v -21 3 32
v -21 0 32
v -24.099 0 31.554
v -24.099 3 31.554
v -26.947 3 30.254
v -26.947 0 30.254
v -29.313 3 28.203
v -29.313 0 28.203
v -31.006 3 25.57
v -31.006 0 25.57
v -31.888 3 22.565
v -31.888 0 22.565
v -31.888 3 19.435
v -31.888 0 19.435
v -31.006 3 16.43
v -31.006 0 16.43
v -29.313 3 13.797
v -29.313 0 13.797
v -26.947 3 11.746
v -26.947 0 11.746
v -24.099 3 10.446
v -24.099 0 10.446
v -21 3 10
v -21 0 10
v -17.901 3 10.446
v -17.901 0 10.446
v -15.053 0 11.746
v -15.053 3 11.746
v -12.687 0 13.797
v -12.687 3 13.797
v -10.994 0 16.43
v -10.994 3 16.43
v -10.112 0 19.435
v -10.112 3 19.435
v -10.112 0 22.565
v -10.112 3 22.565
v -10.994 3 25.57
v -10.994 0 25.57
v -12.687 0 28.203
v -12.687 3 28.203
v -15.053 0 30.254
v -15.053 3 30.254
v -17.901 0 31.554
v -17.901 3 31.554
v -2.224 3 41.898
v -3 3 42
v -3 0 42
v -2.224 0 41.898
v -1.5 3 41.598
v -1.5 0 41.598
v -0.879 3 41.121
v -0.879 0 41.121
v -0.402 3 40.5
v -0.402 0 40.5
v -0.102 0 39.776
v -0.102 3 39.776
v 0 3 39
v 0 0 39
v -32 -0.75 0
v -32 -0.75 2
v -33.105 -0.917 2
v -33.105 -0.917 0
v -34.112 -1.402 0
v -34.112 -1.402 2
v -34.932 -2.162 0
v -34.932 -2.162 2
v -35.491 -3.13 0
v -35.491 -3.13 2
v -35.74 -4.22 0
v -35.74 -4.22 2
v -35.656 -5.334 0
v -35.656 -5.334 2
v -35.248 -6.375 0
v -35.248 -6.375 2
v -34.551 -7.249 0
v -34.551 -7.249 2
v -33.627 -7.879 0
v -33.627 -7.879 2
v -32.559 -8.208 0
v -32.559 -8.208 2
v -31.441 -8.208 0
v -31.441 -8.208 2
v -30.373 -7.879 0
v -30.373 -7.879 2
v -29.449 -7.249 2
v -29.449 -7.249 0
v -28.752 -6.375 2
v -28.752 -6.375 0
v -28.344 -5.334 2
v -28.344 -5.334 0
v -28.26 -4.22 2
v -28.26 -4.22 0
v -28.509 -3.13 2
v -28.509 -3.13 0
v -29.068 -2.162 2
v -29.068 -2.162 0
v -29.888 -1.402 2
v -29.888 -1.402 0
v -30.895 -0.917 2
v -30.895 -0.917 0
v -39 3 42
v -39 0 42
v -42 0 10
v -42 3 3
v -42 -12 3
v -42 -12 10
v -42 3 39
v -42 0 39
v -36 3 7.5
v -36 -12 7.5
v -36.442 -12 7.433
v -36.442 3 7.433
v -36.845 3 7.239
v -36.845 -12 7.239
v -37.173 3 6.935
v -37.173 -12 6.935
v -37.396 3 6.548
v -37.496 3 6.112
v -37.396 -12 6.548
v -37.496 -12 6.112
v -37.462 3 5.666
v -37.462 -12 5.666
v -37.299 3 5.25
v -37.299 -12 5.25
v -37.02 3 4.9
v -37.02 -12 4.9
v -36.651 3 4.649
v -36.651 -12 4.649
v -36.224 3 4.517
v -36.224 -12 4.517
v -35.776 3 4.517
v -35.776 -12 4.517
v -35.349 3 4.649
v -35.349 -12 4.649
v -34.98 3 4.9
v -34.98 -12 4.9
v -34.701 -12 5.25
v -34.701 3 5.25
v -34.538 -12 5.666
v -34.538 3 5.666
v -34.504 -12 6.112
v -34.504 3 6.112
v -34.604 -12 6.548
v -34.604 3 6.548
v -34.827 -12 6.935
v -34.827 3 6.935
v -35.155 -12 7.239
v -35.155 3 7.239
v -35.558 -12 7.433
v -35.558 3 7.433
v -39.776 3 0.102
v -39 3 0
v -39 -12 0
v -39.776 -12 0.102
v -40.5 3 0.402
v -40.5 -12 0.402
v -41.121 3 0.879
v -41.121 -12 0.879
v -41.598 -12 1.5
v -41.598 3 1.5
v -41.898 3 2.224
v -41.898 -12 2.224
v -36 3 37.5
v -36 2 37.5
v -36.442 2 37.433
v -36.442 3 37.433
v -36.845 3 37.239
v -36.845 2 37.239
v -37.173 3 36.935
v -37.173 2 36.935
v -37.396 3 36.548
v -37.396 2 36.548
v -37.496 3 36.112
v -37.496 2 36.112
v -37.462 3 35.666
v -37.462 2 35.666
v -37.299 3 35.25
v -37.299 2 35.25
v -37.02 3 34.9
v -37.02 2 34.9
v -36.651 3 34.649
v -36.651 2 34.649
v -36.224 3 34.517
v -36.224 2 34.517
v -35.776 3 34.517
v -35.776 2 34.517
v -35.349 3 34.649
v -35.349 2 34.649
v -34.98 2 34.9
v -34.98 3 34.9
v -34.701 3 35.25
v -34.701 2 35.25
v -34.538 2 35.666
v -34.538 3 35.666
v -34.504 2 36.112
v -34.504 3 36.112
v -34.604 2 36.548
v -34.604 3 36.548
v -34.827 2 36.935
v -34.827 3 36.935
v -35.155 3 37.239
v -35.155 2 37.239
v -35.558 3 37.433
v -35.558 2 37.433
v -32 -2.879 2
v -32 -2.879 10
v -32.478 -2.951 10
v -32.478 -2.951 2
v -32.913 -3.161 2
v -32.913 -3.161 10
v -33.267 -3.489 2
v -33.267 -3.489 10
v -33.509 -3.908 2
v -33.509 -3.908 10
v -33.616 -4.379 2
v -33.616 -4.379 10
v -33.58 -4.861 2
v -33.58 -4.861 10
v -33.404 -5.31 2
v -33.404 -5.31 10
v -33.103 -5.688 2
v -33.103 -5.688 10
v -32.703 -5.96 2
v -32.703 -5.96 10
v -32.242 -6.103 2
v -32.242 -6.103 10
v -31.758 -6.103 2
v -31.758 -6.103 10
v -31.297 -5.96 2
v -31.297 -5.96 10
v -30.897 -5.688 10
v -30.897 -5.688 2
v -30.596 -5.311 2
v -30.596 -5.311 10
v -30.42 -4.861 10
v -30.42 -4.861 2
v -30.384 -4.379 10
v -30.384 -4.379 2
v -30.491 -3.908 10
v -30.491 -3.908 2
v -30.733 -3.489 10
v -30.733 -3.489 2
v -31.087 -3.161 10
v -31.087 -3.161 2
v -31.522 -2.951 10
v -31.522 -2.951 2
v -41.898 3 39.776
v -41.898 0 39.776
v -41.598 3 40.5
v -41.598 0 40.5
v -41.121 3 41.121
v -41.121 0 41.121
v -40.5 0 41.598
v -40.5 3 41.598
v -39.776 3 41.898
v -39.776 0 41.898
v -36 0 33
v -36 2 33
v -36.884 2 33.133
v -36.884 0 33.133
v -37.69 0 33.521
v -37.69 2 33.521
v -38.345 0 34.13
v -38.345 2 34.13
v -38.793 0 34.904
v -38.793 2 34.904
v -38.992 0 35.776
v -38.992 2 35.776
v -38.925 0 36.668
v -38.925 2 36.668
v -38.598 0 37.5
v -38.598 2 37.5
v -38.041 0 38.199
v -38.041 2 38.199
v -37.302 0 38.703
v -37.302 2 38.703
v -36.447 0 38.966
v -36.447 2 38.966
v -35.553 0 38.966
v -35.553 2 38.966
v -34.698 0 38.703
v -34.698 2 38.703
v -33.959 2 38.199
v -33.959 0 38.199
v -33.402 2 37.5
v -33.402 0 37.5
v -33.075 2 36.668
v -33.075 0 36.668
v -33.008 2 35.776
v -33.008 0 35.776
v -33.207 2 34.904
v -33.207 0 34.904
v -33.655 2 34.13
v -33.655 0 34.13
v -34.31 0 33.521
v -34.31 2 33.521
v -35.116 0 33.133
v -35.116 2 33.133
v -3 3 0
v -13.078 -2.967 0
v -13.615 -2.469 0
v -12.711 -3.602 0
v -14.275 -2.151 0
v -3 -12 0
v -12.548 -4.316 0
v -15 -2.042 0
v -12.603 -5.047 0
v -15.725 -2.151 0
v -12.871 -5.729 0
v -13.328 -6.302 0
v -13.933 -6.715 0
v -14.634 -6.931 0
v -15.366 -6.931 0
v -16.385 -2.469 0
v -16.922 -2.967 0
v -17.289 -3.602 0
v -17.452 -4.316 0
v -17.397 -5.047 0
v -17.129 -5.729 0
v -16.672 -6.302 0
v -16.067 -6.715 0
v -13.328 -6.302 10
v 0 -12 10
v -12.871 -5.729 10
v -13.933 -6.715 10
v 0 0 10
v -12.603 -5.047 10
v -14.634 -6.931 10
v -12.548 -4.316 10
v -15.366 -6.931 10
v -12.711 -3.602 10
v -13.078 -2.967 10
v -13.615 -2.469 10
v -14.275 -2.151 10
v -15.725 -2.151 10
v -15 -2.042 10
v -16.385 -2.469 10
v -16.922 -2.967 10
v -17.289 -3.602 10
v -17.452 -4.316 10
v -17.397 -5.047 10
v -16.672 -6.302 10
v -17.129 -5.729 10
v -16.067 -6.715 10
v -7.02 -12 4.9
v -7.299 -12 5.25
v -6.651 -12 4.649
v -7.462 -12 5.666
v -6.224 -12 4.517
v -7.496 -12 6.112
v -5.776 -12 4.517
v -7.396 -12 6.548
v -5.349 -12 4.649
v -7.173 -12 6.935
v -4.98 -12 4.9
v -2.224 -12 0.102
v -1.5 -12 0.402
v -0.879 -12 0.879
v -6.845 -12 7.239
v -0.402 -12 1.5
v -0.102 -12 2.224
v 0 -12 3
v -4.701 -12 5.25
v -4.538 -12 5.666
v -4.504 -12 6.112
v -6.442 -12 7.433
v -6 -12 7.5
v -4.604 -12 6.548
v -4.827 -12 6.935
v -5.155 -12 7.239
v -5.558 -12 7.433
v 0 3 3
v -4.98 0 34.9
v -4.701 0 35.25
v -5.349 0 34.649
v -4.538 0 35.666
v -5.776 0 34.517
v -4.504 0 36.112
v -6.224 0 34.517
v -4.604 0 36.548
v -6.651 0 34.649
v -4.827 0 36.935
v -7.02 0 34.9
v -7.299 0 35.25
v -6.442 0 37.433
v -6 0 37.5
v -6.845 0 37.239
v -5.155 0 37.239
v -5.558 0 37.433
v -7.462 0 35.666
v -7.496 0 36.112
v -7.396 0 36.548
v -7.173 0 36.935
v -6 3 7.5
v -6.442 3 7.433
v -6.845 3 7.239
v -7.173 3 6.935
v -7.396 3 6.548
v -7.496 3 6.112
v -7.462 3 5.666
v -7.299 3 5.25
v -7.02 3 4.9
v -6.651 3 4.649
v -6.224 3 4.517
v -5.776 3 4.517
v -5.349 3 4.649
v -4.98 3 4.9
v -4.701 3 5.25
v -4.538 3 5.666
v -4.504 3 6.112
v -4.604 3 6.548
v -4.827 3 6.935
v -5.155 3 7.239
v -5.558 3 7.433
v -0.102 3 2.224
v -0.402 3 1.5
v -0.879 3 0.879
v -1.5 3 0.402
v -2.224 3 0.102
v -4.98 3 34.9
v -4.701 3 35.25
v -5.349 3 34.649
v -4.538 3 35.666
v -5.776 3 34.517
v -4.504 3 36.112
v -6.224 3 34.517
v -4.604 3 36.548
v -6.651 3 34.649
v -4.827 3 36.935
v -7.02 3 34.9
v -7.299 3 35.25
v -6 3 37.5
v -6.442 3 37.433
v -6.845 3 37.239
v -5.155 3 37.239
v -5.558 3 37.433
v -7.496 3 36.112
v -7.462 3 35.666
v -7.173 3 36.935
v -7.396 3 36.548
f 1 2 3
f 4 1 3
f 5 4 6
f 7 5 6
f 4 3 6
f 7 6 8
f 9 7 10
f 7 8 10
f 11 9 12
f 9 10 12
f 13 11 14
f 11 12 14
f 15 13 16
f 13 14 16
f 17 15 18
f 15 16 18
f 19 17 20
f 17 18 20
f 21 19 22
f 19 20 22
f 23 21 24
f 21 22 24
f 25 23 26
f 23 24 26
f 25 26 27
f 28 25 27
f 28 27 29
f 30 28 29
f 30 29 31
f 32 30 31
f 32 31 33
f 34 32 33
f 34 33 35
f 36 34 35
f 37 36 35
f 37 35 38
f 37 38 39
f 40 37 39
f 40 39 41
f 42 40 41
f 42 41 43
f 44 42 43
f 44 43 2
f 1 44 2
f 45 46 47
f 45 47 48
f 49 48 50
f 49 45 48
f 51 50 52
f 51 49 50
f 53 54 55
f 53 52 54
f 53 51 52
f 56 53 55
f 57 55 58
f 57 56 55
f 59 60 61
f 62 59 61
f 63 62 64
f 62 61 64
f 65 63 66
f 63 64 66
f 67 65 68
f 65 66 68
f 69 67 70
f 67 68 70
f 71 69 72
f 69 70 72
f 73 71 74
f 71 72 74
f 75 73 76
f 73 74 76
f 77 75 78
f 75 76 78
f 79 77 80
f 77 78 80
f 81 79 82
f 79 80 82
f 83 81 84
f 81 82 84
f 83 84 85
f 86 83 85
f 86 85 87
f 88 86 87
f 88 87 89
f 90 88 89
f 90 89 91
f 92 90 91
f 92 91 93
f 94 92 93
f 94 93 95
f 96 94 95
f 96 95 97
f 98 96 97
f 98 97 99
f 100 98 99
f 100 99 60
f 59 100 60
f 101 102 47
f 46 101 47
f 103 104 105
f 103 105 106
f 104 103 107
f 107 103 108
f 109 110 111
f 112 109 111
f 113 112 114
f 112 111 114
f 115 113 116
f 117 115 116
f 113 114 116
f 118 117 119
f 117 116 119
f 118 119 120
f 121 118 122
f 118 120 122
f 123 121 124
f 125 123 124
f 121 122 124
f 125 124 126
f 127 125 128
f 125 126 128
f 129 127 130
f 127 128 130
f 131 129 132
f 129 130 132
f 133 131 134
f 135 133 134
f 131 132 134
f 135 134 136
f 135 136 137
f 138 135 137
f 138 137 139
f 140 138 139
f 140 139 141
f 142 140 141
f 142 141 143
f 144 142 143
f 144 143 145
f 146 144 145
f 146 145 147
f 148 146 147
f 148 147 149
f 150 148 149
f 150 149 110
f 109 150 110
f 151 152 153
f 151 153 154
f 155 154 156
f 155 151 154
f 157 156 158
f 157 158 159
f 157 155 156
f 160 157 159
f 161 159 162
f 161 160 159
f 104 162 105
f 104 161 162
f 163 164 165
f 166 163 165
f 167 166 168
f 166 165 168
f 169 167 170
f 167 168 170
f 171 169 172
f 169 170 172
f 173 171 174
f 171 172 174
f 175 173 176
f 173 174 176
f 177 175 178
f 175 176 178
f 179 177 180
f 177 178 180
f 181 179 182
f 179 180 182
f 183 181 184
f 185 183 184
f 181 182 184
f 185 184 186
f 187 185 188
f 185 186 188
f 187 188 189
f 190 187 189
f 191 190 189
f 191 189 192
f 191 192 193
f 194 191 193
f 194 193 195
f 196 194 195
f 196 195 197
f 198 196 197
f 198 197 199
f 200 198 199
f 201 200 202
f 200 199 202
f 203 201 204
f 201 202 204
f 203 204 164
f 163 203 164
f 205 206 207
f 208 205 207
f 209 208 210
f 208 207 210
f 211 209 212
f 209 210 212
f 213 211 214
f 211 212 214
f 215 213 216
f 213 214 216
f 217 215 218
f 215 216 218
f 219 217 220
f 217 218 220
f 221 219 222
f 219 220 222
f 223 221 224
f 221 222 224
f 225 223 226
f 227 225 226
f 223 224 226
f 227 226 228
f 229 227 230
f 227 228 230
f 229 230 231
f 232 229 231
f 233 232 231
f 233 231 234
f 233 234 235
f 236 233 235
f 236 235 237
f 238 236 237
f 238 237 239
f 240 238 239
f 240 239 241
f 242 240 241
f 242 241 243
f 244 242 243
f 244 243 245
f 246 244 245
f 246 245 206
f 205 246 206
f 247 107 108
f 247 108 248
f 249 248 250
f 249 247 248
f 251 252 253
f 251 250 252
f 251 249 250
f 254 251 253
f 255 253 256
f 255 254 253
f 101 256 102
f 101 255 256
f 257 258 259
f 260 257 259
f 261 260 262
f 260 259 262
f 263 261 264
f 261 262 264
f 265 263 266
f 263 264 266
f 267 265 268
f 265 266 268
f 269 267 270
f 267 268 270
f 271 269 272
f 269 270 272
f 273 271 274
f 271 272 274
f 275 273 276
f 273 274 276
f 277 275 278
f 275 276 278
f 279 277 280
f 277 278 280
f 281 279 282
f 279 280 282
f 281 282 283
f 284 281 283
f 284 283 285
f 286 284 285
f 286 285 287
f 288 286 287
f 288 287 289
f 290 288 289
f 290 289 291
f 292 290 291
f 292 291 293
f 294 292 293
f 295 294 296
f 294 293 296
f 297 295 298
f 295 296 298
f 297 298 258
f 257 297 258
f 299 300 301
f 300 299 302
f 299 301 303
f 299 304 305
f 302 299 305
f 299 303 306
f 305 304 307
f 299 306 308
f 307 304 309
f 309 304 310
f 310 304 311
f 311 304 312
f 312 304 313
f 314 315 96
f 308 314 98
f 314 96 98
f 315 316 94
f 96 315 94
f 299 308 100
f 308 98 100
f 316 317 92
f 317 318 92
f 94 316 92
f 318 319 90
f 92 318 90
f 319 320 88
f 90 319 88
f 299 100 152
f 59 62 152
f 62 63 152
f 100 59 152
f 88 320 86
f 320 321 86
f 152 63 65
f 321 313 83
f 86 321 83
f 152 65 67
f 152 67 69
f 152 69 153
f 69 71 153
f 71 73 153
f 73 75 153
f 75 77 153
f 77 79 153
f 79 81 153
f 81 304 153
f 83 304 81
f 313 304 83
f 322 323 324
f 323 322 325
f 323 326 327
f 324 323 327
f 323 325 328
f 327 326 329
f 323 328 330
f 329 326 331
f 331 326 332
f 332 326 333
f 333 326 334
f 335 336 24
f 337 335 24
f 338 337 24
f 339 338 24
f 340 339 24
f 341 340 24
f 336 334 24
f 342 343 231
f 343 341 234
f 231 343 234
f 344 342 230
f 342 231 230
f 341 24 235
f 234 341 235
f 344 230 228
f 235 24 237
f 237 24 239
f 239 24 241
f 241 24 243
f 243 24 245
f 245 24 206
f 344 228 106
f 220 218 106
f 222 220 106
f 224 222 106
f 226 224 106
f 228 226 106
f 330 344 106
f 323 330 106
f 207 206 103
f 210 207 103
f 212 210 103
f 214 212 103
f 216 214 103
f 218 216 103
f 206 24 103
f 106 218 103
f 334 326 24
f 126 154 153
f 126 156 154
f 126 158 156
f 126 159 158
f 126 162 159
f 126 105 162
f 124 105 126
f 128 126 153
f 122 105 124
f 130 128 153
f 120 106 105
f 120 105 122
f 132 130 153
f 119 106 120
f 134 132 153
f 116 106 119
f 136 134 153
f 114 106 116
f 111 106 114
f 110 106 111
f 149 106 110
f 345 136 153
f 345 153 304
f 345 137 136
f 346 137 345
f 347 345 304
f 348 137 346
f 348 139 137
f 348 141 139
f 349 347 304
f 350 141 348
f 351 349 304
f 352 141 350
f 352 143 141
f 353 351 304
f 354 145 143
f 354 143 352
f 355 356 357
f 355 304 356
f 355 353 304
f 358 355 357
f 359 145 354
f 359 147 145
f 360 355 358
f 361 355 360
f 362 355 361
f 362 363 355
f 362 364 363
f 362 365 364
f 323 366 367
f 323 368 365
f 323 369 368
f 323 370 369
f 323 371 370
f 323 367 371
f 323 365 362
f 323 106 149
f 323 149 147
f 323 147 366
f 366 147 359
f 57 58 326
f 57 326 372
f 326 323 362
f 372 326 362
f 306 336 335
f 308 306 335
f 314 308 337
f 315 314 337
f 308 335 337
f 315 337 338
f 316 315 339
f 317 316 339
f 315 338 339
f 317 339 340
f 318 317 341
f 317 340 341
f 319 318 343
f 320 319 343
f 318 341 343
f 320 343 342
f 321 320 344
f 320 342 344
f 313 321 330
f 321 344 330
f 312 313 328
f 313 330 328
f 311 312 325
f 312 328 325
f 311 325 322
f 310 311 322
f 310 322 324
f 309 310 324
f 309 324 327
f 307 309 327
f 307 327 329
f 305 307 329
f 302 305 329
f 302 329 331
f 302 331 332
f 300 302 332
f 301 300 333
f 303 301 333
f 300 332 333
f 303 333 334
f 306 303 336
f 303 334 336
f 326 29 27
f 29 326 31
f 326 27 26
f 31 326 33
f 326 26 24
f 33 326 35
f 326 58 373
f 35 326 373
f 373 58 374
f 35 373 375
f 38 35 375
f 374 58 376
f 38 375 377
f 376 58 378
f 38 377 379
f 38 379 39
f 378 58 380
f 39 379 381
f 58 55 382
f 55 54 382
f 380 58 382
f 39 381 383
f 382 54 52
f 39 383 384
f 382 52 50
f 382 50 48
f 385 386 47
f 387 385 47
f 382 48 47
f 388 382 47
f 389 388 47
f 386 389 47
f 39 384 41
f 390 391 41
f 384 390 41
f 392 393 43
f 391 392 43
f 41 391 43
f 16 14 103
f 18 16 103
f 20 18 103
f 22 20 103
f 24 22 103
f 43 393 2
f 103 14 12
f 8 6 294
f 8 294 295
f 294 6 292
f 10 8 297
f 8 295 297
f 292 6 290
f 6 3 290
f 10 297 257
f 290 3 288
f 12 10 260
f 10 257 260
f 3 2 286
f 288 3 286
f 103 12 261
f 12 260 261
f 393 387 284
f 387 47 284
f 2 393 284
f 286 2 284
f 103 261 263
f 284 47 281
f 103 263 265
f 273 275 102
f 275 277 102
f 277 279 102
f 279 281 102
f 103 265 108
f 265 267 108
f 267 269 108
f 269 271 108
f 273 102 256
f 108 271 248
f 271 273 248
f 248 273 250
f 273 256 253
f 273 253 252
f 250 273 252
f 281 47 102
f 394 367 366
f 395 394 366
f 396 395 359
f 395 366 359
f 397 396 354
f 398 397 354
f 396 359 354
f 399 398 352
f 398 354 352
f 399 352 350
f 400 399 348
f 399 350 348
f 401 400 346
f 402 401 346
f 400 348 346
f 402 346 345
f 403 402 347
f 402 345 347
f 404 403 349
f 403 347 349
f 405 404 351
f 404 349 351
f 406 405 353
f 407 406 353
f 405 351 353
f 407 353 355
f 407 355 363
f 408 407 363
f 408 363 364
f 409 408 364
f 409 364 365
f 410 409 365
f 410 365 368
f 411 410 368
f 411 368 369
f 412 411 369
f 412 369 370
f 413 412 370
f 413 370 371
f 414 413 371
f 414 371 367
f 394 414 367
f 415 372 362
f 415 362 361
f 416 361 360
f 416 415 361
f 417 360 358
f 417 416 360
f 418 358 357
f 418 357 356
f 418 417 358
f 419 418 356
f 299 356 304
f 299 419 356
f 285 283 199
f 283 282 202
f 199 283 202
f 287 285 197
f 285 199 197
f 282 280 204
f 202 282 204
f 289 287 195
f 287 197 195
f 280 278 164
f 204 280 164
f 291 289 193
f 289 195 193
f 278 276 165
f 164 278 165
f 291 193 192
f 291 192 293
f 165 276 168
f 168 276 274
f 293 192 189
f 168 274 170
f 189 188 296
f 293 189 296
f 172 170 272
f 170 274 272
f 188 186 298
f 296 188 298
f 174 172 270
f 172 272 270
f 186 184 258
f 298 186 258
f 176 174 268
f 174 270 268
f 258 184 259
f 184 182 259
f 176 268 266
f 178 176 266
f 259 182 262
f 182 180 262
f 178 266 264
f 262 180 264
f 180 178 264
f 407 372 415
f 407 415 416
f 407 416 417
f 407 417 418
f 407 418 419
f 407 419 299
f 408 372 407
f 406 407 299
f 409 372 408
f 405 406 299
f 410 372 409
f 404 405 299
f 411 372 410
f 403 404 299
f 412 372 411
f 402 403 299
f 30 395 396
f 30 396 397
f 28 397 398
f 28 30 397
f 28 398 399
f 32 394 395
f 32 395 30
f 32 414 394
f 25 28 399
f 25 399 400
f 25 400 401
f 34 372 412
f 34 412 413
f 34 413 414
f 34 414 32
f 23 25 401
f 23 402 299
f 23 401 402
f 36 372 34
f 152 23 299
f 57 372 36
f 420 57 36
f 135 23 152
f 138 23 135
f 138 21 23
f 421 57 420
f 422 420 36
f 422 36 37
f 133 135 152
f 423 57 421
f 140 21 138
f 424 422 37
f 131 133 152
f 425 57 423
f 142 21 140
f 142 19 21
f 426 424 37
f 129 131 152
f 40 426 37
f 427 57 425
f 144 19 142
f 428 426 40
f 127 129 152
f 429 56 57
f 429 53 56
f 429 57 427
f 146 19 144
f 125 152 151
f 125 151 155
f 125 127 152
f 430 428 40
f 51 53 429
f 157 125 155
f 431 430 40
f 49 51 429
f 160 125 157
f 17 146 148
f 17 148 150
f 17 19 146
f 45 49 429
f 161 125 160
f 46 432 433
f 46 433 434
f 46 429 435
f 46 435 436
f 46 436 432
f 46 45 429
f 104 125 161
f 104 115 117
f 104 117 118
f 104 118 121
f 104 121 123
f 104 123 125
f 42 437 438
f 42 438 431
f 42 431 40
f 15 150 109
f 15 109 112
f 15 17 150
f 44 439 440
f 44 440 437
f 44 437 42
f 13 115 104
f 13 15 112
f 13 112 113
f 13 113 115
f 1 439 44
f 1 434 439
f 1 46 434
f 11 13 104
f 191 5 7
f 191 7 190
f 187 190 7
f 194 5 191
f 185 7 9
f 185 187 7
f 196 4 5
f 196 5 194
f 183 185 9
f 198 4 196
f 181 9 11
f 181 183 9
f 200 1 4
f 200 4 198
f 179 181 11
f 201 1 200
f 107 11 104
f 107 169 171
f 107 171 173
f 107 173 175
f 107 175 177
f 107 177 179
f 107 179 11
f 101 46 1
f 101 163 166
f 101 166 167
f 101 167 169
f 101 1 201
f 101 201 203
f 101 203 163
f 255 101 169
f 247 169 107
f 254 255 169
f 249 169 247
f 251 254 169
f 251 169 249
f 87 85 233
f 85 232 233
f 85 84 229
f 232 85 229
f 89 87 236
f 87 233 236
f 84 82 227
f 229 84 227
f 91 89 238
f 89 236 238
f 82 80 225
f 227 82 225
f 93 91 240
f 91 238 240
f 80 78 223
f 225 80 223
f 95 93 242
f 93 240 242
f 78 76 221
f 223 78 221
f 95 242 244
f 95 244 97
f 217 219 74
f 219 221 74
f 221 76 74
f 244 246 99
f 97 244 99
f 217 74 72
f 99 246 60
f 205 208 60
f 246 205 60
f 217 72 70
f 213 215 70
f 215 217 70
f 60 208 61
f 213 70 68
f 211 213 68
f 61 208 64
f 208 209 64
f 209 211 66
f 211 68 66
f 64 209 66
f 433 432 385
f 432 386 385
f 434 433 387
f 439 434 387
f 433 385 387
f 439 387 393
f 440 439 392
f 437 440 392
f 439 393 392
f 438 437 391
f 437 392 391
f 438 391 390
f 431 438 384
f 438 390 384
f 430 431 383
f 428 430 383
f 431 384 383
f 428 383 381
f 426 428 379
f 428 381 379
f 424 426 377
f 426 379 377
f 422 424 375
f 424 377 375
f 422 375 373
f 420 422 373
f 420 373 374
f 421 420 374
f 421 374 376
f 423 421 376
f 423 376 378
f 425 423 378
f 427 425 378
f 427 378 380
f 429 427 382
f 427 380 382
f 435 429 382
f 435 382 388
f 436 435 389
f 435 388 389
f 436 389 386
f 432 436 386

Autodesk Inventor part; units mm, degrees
ref_plane "YZ Plane" through (0, 0, 0) normal (1, 0, 0) x (0, 1, 0)
ref_plane "XZ Plane" through (0, 0, 0) normal (0, 1, 0) x (-1, 0, 0)
ref_plane "XY Plane" through (0, 0, 0) normal (0, 0, 1) x (1, 0, 0)
sketch "草圖1" plane through (0, 0, 0) normal (0, 1, 0) x (-1, 0, 0)
  line L0 (0, 0) -> (42, 0)
  line L1 (42, 0) -> (42, 42)
  line L2 (42, 42) -> (0, 42)
  line L3 (0, 42) -> (0, 0)
  dimension "d0" = 42
  dimension "d1" = 42
extrude "擠出1" add sketch "草圖1" along normal blind 3
sketch "草圖2" plane through (0, 0, 0) normal (0, -1, 0) x (1, 0, 0)
  line L0 (0, 0) -> (-42, 0) projected
  line L1 (0, 42) -> (0, 0) projected
  line L2 (-42, 0) -> (0, 0)
  line L3 (0, 0) -> (0, 10)
  line L4 (0, 10) -> (-42, 10)
  line L5 (-42, 10) -> (-42, 0)
  dimension "d4" = 10
extrude "擠出2" add sketch "草圖2" along normal blind 12
sketch "草圖3" plane through (0, 3, 0) normal (0, 1, 0) x (1, 0, 0)
  point P0 (-21, -21)
hole "孔1" at (-21, 3, 21) direction (0, -1, 0) diameter 22 end through all
sketch "草圖4" plane through (0, 3, 0) normal (0, 1, 0) x (1, 0, 0)
  circle A0 centre (-21, -21) radius 11 projected
  point P0 (-36, -6)
  point P1 (-36, -36)
  point P2 (-6, -6)
  point P3 (-6, -36)
  dimension "d15" = 15
  dimension "d16" = 15
  dimension "d17" = 15
  dimension "d18" = 15
hole "孔2" at (-36, 3, 6) at (-36, 3, 36) at (-6, 3, 6) at (-6, 3, 36) direction (0, -1, 0) diameter 3 end through all
fillet "圓角1" radius 3 4 edges at (0, 1.5, 42) (0, -4.5, 0) (-42, 1.5, 42) (-42, -4.5, 0)
sketch "草圖5" plane through (0, 0, 0) normal (0, -1, 0) x (1, 0, 0)
  circle A0 centre (-36, 36) radius 1.5 projected
  point P0 (0, 0)
hole "孔3" at (-36, 0, 36) direction (0, 1, 0) diameter 6 depth 2
sketch "草圖6" plane through (-3, 3, 0) normal (0, 0, -1) x (-1, 0, 0)
  line L0 (0, 0) -> (36, 0) projected
  line L1 (-3, 0) -> (-3, -15) projected
  point P0 (-3, -3)
  point P1 (12, -7.5)
  dimension "d35" = 7.5
  dimension "d36" = 15
hole "孔4" at (-15, -4.5, 0) direction (0, 0, 1) diameter 4.917 end through all thread size "M6x1" class "6H" standard "ANSI Metric M Profile"
sketch "草圖7" plane through (-3, 3, 0) normal (0, 0, -1) x (-1, 0, 0)
  line L0 (39, -15) -> (39, 0) projected
  point P0 (-3, -3)
  point P1 (29, -7.5)
  dimension "d44" = 10
hole "孔5" at (-32, -4.5, 0) direction (0, 0, 1) diameter 3.242 end through all counterbore diameter 7.5 counterbore depth 2 thread size "M4x0.7" class "6H" standard "ANSI Metric M Profile"
properties part number "extruder_base"
